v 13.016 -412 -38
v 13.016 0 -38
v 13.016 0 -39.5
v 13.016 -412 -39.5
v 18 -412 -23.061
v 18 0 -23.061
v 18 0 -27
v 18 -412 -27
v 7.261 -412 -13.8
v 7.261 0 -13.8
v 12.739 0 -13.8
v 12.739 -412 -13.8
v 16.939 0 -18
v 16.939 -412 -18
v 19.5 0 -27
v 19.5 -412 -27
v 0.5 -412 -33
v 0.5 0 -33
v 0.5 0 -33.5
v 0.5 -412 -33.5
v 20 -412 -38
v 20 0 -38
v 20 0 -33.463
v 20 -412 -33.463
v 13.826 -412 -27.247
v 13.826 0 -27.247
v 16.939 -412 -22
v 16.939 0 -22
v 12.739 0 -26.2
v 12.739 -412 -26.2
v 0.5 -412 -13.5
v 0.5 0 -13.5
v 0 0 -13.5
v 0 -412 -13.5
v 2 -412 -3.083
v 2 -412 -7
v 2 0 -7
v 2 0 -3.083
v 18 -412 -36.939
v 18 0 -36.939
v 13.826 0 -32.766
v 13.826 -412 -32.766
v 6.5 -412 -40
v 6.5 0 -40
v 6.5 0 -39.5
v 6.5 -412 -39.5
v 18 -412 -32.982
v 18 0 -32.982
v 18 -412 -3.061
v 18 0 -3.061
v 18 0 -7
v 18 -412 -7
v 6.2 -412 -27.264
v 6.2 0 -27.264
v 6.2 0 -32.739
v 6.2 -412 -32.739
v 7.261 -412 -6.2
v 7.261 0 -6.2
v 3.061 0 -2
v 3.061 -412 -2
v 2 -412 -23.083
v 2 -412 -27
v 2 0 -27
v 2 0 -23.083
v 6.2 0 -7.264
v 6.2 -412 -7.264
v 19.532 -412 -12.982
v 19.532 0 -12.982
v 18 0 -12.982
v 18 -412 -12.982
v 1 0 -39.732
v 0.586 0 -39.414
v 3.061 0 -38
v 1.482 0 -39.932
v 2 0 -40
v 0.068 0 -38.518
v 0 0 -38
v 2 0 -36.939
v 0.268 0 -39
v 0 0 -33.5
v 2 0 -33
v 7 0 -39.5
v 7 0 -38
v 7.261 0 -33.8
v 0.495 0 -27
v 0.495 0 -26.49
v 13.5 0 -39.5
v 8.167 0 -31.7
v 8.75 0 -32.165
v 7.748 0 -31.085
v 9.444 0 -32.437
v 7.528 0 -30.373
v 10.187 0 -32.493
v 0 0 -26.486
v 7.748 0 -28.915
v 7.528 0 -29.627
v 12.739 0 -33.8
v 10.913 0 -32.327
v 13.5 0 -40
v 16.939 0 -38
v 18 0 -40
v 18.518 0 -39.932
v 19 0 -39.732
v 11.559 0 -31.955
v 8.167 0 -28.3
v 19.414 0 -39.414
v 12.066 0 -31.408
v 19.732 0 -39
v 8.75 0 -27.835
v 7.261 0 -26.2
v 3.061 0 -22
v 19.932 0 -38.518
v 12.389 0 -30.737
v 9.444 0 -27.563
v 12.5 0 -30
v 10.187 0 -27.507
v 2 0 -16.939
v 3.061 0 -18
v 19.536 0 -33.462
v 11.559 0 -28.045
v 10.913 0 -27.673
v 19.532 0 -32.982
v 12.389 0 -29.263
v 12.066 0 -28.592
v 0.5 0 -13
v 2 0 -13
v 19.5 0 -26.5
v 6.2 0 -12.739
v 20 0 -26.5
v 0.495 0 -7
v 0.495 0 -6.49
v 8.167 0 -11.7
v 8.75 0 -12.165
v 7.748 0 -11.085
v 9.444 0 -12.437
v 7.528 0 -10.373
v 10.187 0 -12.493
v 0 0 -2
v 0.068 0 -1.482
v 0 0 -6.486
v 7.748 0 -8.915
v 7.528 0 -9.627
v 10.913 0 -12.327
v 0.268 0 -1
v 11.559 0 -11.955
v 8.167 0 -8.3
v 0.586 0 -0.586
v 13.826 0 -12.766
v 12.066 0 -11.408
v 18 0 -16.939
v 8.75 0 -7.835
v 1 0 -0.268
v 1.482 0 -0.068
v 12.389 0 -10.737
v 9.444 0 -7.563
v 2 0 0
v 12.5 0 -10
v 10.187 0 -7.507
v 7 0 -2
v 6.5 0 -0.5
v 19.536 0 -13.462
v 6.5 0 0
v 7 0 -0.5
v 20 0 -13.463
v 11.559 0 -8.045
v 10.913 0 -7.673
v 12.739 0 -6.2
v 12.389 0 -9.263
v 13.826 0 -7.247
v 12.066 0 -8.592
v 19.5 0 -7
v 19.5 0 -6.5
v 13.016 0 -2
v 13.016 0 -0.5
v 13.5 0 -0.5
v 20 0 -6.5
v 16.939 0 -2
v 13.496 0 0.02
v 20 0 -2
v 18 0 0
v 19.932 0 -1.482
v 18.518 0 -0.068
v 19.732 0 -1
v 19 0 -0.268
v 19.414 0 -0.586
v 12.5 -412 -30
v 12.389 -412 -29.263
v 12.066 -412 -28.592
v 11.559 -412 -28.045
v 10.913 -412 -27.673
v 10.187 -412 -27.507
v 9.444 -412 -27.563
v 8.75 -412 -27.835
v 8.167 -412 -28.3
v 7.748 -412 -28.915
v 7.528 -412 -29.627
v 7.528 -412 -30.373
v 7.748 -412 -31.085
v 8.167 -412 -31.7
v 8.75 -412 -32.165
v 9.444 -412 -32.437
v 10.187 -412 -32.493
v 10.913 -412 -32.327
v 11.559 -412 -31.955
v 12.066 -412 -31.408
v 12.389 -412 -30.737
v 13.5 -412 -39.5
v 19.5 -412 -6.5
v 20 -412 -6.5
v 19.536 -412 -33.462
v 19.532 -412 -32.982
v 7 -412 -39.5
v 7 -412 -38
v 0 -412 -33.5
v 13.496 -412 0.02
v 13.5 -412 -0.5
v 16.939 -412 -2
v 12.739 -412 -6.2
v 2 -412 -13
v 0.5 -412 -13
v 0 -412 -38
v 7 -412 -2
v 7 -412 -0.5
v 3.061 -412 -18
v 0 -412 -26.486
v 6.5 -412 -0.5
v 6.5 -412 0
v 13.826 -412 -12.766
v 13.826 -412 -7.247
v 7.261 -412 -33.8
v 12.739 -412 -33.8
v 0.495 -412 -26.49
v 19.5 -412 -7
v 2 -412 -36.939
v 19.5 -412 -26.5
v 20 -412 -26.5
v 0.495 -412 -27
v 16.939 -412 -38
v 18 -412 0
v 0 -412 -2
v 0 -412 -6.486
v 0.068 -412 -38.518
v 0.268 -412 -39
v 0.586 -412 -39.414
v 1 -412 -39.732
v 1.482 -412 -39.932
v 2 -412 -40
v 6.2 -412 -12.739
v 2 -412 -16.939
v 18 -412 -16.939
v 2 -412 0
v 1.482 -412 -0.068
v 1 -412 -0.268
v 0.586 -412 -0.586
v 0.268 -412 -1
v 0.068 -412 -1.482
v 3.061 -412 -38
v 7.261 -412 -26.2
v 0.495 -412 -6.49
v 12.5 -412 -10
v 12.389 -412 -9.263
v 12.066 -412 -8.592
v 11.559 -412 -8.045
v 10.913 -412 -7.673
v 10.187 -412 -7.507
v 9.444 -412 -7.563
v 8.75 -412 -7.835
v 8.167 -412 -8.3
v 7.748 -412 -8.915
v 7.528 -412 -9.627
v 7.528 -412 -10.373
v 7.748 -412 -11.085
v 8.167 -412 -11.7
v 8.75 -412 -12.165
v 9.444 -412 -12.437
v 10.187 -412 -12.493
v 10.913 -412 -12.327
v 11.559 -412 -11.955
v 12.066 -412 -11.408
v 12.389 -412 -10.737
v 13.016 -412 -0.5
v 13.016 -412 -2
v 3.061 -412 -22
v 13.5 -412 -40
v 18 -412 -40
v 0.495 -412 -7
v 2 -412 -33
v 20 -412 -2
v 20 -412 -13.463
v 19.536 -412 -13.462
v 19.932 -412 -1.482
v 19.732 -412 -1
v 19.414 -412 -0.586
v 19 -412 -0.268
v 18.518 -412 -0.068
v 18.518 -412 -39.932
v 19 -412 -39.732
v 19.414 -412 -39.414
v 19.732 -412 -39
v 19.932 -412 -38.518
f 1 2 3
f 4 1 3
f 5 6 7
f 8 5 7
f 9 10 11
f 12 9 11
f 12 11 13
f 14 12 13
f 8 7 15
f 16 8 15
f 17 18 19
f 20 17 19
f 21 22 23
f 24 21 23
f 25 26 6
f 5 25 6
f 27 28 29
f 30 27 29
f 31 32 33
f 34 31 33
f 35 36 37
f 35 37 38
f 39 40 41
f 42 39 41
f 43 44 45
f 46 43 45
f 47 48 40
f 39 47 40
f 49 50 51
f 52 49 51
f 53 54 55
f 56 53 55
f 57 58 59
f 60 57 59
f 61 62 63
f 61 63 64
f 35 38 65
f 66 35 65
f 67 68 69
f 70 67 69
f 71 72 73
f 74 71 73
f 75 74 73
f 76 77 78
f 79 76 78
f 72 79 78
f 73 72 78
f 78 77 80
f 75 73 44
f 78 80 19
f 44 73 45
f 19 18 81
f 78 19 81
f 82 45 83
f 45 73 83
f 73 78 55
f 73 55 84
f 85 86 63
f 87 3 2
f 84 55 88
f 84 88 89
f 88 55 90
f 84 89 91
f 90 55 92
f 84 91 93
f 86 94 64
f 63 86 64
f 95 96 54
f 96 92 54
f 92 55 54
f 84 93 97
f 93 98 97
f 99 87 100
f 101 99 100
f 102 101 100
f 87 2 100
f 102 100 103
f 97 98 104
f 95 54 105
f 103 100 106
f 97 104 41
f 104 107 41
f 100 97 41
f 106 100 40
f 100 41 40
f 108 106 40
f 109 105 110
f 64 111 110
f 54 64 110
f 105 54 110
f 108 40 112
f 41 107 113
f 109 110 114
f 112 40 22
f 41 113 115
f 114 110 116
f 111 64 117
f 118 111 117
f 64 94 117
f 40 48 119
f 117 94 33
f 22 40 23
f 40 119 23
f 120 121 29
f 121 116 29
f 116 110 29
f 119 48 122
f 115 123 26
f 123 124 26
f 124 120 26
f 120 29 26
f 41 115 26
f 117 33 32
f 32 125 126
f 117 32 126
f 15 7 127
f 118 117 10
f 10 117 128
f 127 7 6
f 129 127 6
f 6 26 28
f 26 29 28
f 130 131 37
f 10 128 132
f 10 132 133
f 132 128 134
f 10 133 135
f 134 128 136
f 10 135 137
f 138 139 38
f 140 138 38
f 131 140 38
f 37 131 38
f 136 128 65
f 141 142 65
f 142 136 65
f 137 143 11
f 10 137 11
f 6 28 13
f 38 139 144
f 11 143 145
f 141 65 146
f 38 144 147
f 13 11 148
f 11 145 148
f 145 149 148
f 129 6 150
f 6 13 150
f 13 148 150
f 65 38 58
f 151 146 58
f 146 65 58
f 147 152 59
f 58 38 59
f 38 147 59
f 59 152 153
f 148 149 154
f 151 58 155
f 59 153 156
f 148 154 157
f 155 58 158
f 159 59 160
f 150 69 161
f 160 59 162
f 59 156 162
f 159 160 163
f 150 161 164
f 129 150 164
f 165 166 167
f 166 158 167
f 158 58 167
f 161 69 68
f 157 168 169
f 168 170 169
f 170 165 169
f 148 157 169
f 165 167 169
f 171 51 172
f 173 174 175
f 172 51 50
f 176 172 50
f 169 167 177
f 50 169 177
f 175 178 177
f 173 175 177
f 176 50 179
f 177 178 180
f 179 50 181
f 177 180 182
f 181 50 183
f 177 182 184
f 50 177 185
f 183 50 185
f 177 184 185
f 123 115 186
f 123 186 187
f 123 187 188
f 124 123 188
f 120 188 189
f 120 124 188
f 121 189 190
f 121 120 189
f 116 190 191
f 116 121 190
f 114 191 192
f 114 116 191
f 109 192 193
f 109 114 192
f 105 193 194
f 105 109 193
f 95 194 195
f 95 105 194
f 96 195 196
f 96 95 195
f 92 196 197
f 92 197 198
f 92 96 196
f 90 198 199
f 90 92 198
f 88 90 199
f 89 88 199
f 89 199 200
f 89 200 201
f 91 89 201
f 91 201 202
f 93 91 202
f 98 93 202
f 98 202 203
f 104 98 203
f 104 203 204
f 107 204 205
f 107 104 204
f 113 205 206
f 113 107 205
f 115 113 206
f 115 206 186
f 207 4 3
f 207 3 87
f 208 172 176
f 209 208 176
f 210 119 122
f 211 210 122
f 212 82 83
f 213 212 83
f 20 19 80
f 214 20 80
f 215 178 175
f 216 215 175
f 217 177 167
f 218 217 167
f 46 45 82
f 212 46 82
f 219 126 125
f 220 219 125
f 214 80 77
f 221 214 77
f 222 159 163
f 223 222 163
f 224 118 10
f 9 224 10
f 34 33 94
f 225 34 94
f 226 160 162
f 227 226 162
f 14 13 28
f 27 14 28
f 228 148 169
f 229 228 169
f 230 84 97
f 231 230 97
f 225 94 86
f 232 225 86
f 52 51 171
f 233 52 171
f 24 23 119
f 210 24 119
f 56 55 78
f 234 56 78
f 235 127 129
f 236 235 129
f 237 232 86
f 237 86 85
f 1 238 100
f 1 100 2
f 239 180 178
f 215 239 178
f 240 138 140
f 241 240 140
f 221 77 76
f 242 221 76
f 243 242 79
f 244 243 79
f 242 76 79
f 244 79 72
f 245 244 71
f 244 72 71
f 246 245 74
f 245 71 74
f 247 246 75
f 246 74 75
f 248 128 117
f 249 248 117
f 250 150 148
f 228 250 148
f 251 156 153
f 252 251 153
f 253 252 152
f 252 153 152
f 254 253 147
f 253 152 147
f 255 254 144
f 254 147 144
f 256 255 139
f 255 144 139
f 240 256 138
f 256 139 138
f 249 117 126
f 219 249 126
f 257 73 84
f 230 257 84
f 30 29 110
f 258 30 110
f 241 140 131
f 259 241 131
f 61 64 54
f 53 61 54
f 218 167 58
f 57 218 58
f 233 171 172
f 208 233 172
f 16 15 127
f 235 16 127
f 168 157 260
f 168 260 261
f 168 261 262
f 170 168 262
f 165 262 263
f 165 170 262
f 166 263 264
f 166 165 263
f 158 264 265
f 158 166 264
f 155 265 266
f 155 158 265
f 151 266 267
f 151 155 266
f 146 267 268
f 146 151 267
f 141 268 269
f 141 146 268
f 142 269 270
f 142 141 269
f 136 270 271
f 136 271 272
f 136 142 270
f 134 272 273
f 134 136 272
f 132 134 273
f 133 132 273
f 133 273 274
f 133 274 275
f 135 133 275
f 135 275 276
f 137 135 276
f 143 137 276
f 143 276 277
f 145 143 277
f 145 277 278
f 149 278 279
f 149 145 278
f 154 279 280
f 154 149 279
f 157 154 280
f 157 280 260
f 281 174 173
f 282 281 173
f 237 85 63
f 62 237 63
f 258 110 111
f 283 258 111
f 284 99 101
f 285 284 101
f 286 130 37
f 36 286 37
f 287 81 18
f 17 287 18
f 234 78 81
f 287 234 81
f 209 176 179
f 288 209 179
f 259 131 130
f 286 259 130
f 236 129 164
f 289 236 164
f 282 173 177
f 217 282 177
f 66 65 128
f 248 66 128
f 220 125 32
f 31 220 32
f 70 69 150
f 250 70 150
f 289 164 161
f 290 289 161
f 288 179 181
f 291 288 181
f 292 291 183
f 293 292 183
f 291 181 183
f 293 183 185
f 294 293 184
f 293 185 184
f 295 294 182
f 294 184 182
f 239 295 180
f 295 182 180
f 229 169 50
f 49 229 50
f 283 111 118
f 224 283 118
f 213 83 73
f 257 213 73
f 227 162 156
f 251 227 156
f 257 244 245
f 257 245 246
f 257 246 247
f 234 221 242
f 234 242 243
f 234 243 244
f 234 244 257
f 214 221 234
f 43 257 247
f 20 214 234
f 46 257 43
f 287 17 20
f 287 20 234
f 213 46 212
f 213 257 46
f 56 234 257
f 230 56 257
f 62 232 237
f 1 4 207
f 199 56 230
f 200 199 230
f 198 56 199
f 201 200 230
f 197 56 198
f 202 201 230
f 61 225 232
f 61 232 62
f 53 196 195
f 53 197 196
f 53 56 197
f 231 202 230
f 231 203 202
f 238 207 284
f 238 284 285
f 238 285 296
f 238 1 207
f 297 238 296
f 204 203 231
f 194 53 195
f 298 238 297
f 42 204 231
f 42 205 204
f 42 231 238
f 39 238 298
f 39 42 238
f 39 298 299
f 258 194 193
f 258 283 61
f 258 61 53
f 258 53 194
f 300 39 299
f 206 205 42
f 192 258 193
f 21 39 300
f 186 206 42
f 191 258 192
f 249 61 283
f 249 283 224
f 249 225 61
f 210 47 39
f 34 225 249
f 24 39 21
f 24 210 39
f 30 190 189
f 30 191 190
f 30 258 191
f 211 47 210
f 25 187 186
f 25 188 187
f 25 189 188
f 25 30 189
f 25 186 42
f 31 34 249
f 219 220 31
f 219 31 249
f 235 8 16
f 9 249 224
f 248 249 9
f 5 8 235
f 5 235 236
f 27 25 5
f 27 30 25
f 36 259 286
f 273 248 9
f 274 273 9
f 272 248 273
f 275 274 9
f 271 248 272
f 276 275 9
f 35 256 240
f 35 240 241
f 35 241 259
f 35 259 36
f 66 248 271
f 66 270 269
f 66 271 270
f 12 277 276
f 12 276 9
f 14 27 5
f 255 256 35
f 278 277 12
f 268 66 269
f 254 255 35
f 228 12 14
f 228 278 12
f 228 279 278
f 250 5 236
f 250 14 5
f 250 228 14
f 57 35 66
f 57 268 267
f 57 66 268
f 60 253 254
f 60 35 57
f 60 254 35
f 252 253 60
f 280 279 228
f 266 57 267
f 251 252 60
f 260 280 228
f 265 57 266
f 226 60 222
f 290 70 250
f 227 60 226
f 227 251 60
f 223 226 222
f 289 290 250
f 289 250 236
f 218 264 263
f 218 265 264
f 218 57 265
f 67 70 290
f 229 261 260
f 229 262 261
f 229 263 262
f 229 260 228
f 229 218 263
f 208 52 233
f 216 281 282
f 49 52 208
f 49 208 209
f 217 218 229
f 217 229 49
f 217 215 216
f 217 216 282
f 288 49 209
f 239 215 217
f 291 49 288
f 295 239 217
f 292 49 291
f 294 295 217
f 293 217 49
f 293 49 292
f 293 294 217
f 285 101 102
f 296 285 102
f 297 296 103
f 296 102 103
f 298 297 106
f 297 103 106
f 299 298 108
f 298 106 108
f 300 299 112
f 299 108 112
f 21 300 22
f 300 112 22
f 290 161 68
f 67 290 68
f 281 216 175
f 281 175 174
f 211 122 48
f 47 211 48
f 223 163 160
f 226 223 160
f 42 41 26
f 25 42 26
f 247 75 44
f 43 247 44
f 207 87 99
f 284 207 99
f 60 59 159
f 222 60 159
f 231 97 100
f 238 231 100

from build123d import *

# Parameters (mm, degrees)
F0_R     = 2.5
F2_DEPTH = 412


with BuildPart() as f2:
    # F0 (on Front) → F2 (new body)
    with BuildSketch(Plane.XZ):
        with BuildLine():
            Line((6.5, 0), (2, 0))
            ThreePointArc((2, 0), (0.5857864376, -0.5857864376), (0, -2))
            Line((0, -2), (0, -6.4857100192))
            Line((0, -6.4857100192), (0.4948230833, -6.489995392))
            Line((0.4948230833, -6.489995392), (0.4948230833, -7))
            Line((0.4948230833, -7), (2, -7))
            Line((2, -7), (2, -3.0833937817))
            Line((2, -3.0833937817), (6.2, -7.2637052917))
            Line((6.2, -7.2637052917), (6.2, -12.7393398282))
            Line((6.2, -12.7393398282), (2, -16.9393398282))
            Line((2, -16.9393398282), (2, -13))
            Line((2, -13), (0.5, -13))
            Line((0.5, -13), (0.5, -13.5))
            Line((0.5, -13.5), (0, -13.5))
            Line((0, -13.5), (0, -26.4857100192))
            Line((0, -26.4857100192), (0.4948230833, -26.489995392))
            Line((0.4948230833, -26.489995392), (0.4948230833, -27))
            Line((0.4948230833, -27), (2, -27))
            Line((2, -27), (2, -23.0833937817))
            Line((2, -23.0833937817), (6.2, -27.2637052917))
            Line((6.2, -27.2637052917), (6.2, -32.7393398282))
            Line((6.2, -32.7393398282), (2, -36.9393398282))
            Line((2, -36.9393398282), (2, -33))
            Line((2, -33), (0.5, -33))
            Line((0.5, -33), (0.5, -33.5))
            Line((0.5, -33.5), (0, -33.5))
            Line((0, -33.5), (0, -38))
            ThreePointArc((0, -38), (0.5857864376, -39.4142135624), (2, -40))
            Line((2, -40), (6.5, -40))
            Line((6.5, -40), (6.5, -39.5))
            Line((6.5, -39.5), (7, -39.5))
            Line((7, -39.5), (7, -38))
            Line((7, -38), (3.0606601718, -38))
            Line((3.0606601718, -38), (7.2606601718, -33.8))
            Line((7.2606601718, -33.8), (12.7393398282, -33.8))
            Line((12.7393398282, -33.8), (16.9393398282, -38))
            Line((16.9393398282, -38), (13.015800612, -38))
            Line((13.015800612, -38), (13.015800612, -39.5))
            Line((13.015800612, -39.5), (13.5, -39.5))
            Line((13.5, -39.5), (13.5, -40))
            Line((13.5, -40), (18, -40))
            ThreePointArc((18, -40), (19.4142135624, -39.4142135624), (20, -38))
            Line((20, -38), (20, -33.4626608249))
            Line((20, -33.4626608249), (19.5363645284, -33.4624647606))
            Line((19.5363645284, -33.4624647606), (19.532302618, -32.9822008219))
            Line((19.532302618, -32.9822008219), (18, -32.9822008219))
            Line((18, -32.9822008219), (17.9998106987, -36.9393398192))
            Line((17.9998106987, -36.9393398192), (13.8264202785, -32.765949399))
            Line((13.8264202785, -32.765949399), (13.8264202785, -27.246708479))
            Line((13.8264202785, -27.246708479), (17.9998106987, -23.0606601627))
            Line((17.9998106987, -23.0606601627), (17.9998106987, -26.9999999909))
            Line((17.9998106987, -26.9999999909), (19.4998106987, -26.9999999909))
            Line((19.4998106987, -26.9999999909), (19.4998106987, -26.4999999909))
            Line((19.4998106987, -26.4999999909), (20, -26.4999999909))
            Line((20, -26.4999999909), (20, -13.4626608249))
            Line((20, -13.4626608249), (19.5363645284, -13.4624647606))
            Line((19.5363645284, -13.4624647606), (19.532302618, -12.9822008219))
            Line((19.532302618, -12.9822008219), (18, -12.9822008219))
            Line((18, -12.9822008219), (17.9998106987, -16.9393398192))
            Line((17.9998106987, -16.9393398192), (13.8264202785, -12.765949399))
            Line((13.8264202785, -12.765949399), (13.8264202785, -7.246708479))
            Line((13.8264202785, -7.246708479), (17.9998106987, -3.0606601627))
            Line((17.9998106987, -3.0606601627), (17.9998106987, -6.9999999909))
            Line((17.9998106987, -6.9999999909), (19.4998106987, -6.9999999909))
            Line((19.4998106987, -6.9999999909), (19.4998106987, -6.4999999909))
            Line((19.4998106987, -6.4999999909), (20, -6.4999999909))
            Line((20, -6.4999999909), (20, -2))
            ThreePointArc((20, -2), (19.4142135624, -0.5857864376), (18, 0))
            Line((18, 0), (13.4962801728, 0.0202495232))
            Line((13.4962801728, 0.0202495232), (13.5, -0.5))
            Line((13.5, -0.5), (13.015800612, -0.5))
            Line((13.015800612, -0.5), (13.015800612, -2))
            Line((13.015800612, -2), (16.9393398282, -2))
            Line((16.9393398282, -2), (12.7393121854, -6.2000276428))
            Line((12.7393121854, -6.2000276428), (7.2606601718, -6.2))
            Line((7.2606601718, -6.2), (3.0606601718, -2))
            Line((3.0606601718, -2), (7, -2))
            Line((7, -2), (7, -0.5))
            Line((7, -0.5), (6.5, -0.5))
            Line((6.5, -0.5), (6.5, 0))
        make_face()
        with Locations((10, -30)):
            Circle(F0_R, mode=Mode.SUBTRACT)
        Polygon((7.2606601718, -13.8), (12.7393398282, -13.8), (16.9393398282, -18), (16.9393398282, -22), (12.7393121854, -26.2000276428), (7.2606601718, -26.2), (3.0606601718, -22), (3.0606601718, -18), align=None, mode=Mode.SUBTRACT)
        with Locations((10, -10)):
            Circle(F0_R, mode=Mode.SUBTRACT)
    extrude(amount=F2_DEPTH)


solid = f2.part
